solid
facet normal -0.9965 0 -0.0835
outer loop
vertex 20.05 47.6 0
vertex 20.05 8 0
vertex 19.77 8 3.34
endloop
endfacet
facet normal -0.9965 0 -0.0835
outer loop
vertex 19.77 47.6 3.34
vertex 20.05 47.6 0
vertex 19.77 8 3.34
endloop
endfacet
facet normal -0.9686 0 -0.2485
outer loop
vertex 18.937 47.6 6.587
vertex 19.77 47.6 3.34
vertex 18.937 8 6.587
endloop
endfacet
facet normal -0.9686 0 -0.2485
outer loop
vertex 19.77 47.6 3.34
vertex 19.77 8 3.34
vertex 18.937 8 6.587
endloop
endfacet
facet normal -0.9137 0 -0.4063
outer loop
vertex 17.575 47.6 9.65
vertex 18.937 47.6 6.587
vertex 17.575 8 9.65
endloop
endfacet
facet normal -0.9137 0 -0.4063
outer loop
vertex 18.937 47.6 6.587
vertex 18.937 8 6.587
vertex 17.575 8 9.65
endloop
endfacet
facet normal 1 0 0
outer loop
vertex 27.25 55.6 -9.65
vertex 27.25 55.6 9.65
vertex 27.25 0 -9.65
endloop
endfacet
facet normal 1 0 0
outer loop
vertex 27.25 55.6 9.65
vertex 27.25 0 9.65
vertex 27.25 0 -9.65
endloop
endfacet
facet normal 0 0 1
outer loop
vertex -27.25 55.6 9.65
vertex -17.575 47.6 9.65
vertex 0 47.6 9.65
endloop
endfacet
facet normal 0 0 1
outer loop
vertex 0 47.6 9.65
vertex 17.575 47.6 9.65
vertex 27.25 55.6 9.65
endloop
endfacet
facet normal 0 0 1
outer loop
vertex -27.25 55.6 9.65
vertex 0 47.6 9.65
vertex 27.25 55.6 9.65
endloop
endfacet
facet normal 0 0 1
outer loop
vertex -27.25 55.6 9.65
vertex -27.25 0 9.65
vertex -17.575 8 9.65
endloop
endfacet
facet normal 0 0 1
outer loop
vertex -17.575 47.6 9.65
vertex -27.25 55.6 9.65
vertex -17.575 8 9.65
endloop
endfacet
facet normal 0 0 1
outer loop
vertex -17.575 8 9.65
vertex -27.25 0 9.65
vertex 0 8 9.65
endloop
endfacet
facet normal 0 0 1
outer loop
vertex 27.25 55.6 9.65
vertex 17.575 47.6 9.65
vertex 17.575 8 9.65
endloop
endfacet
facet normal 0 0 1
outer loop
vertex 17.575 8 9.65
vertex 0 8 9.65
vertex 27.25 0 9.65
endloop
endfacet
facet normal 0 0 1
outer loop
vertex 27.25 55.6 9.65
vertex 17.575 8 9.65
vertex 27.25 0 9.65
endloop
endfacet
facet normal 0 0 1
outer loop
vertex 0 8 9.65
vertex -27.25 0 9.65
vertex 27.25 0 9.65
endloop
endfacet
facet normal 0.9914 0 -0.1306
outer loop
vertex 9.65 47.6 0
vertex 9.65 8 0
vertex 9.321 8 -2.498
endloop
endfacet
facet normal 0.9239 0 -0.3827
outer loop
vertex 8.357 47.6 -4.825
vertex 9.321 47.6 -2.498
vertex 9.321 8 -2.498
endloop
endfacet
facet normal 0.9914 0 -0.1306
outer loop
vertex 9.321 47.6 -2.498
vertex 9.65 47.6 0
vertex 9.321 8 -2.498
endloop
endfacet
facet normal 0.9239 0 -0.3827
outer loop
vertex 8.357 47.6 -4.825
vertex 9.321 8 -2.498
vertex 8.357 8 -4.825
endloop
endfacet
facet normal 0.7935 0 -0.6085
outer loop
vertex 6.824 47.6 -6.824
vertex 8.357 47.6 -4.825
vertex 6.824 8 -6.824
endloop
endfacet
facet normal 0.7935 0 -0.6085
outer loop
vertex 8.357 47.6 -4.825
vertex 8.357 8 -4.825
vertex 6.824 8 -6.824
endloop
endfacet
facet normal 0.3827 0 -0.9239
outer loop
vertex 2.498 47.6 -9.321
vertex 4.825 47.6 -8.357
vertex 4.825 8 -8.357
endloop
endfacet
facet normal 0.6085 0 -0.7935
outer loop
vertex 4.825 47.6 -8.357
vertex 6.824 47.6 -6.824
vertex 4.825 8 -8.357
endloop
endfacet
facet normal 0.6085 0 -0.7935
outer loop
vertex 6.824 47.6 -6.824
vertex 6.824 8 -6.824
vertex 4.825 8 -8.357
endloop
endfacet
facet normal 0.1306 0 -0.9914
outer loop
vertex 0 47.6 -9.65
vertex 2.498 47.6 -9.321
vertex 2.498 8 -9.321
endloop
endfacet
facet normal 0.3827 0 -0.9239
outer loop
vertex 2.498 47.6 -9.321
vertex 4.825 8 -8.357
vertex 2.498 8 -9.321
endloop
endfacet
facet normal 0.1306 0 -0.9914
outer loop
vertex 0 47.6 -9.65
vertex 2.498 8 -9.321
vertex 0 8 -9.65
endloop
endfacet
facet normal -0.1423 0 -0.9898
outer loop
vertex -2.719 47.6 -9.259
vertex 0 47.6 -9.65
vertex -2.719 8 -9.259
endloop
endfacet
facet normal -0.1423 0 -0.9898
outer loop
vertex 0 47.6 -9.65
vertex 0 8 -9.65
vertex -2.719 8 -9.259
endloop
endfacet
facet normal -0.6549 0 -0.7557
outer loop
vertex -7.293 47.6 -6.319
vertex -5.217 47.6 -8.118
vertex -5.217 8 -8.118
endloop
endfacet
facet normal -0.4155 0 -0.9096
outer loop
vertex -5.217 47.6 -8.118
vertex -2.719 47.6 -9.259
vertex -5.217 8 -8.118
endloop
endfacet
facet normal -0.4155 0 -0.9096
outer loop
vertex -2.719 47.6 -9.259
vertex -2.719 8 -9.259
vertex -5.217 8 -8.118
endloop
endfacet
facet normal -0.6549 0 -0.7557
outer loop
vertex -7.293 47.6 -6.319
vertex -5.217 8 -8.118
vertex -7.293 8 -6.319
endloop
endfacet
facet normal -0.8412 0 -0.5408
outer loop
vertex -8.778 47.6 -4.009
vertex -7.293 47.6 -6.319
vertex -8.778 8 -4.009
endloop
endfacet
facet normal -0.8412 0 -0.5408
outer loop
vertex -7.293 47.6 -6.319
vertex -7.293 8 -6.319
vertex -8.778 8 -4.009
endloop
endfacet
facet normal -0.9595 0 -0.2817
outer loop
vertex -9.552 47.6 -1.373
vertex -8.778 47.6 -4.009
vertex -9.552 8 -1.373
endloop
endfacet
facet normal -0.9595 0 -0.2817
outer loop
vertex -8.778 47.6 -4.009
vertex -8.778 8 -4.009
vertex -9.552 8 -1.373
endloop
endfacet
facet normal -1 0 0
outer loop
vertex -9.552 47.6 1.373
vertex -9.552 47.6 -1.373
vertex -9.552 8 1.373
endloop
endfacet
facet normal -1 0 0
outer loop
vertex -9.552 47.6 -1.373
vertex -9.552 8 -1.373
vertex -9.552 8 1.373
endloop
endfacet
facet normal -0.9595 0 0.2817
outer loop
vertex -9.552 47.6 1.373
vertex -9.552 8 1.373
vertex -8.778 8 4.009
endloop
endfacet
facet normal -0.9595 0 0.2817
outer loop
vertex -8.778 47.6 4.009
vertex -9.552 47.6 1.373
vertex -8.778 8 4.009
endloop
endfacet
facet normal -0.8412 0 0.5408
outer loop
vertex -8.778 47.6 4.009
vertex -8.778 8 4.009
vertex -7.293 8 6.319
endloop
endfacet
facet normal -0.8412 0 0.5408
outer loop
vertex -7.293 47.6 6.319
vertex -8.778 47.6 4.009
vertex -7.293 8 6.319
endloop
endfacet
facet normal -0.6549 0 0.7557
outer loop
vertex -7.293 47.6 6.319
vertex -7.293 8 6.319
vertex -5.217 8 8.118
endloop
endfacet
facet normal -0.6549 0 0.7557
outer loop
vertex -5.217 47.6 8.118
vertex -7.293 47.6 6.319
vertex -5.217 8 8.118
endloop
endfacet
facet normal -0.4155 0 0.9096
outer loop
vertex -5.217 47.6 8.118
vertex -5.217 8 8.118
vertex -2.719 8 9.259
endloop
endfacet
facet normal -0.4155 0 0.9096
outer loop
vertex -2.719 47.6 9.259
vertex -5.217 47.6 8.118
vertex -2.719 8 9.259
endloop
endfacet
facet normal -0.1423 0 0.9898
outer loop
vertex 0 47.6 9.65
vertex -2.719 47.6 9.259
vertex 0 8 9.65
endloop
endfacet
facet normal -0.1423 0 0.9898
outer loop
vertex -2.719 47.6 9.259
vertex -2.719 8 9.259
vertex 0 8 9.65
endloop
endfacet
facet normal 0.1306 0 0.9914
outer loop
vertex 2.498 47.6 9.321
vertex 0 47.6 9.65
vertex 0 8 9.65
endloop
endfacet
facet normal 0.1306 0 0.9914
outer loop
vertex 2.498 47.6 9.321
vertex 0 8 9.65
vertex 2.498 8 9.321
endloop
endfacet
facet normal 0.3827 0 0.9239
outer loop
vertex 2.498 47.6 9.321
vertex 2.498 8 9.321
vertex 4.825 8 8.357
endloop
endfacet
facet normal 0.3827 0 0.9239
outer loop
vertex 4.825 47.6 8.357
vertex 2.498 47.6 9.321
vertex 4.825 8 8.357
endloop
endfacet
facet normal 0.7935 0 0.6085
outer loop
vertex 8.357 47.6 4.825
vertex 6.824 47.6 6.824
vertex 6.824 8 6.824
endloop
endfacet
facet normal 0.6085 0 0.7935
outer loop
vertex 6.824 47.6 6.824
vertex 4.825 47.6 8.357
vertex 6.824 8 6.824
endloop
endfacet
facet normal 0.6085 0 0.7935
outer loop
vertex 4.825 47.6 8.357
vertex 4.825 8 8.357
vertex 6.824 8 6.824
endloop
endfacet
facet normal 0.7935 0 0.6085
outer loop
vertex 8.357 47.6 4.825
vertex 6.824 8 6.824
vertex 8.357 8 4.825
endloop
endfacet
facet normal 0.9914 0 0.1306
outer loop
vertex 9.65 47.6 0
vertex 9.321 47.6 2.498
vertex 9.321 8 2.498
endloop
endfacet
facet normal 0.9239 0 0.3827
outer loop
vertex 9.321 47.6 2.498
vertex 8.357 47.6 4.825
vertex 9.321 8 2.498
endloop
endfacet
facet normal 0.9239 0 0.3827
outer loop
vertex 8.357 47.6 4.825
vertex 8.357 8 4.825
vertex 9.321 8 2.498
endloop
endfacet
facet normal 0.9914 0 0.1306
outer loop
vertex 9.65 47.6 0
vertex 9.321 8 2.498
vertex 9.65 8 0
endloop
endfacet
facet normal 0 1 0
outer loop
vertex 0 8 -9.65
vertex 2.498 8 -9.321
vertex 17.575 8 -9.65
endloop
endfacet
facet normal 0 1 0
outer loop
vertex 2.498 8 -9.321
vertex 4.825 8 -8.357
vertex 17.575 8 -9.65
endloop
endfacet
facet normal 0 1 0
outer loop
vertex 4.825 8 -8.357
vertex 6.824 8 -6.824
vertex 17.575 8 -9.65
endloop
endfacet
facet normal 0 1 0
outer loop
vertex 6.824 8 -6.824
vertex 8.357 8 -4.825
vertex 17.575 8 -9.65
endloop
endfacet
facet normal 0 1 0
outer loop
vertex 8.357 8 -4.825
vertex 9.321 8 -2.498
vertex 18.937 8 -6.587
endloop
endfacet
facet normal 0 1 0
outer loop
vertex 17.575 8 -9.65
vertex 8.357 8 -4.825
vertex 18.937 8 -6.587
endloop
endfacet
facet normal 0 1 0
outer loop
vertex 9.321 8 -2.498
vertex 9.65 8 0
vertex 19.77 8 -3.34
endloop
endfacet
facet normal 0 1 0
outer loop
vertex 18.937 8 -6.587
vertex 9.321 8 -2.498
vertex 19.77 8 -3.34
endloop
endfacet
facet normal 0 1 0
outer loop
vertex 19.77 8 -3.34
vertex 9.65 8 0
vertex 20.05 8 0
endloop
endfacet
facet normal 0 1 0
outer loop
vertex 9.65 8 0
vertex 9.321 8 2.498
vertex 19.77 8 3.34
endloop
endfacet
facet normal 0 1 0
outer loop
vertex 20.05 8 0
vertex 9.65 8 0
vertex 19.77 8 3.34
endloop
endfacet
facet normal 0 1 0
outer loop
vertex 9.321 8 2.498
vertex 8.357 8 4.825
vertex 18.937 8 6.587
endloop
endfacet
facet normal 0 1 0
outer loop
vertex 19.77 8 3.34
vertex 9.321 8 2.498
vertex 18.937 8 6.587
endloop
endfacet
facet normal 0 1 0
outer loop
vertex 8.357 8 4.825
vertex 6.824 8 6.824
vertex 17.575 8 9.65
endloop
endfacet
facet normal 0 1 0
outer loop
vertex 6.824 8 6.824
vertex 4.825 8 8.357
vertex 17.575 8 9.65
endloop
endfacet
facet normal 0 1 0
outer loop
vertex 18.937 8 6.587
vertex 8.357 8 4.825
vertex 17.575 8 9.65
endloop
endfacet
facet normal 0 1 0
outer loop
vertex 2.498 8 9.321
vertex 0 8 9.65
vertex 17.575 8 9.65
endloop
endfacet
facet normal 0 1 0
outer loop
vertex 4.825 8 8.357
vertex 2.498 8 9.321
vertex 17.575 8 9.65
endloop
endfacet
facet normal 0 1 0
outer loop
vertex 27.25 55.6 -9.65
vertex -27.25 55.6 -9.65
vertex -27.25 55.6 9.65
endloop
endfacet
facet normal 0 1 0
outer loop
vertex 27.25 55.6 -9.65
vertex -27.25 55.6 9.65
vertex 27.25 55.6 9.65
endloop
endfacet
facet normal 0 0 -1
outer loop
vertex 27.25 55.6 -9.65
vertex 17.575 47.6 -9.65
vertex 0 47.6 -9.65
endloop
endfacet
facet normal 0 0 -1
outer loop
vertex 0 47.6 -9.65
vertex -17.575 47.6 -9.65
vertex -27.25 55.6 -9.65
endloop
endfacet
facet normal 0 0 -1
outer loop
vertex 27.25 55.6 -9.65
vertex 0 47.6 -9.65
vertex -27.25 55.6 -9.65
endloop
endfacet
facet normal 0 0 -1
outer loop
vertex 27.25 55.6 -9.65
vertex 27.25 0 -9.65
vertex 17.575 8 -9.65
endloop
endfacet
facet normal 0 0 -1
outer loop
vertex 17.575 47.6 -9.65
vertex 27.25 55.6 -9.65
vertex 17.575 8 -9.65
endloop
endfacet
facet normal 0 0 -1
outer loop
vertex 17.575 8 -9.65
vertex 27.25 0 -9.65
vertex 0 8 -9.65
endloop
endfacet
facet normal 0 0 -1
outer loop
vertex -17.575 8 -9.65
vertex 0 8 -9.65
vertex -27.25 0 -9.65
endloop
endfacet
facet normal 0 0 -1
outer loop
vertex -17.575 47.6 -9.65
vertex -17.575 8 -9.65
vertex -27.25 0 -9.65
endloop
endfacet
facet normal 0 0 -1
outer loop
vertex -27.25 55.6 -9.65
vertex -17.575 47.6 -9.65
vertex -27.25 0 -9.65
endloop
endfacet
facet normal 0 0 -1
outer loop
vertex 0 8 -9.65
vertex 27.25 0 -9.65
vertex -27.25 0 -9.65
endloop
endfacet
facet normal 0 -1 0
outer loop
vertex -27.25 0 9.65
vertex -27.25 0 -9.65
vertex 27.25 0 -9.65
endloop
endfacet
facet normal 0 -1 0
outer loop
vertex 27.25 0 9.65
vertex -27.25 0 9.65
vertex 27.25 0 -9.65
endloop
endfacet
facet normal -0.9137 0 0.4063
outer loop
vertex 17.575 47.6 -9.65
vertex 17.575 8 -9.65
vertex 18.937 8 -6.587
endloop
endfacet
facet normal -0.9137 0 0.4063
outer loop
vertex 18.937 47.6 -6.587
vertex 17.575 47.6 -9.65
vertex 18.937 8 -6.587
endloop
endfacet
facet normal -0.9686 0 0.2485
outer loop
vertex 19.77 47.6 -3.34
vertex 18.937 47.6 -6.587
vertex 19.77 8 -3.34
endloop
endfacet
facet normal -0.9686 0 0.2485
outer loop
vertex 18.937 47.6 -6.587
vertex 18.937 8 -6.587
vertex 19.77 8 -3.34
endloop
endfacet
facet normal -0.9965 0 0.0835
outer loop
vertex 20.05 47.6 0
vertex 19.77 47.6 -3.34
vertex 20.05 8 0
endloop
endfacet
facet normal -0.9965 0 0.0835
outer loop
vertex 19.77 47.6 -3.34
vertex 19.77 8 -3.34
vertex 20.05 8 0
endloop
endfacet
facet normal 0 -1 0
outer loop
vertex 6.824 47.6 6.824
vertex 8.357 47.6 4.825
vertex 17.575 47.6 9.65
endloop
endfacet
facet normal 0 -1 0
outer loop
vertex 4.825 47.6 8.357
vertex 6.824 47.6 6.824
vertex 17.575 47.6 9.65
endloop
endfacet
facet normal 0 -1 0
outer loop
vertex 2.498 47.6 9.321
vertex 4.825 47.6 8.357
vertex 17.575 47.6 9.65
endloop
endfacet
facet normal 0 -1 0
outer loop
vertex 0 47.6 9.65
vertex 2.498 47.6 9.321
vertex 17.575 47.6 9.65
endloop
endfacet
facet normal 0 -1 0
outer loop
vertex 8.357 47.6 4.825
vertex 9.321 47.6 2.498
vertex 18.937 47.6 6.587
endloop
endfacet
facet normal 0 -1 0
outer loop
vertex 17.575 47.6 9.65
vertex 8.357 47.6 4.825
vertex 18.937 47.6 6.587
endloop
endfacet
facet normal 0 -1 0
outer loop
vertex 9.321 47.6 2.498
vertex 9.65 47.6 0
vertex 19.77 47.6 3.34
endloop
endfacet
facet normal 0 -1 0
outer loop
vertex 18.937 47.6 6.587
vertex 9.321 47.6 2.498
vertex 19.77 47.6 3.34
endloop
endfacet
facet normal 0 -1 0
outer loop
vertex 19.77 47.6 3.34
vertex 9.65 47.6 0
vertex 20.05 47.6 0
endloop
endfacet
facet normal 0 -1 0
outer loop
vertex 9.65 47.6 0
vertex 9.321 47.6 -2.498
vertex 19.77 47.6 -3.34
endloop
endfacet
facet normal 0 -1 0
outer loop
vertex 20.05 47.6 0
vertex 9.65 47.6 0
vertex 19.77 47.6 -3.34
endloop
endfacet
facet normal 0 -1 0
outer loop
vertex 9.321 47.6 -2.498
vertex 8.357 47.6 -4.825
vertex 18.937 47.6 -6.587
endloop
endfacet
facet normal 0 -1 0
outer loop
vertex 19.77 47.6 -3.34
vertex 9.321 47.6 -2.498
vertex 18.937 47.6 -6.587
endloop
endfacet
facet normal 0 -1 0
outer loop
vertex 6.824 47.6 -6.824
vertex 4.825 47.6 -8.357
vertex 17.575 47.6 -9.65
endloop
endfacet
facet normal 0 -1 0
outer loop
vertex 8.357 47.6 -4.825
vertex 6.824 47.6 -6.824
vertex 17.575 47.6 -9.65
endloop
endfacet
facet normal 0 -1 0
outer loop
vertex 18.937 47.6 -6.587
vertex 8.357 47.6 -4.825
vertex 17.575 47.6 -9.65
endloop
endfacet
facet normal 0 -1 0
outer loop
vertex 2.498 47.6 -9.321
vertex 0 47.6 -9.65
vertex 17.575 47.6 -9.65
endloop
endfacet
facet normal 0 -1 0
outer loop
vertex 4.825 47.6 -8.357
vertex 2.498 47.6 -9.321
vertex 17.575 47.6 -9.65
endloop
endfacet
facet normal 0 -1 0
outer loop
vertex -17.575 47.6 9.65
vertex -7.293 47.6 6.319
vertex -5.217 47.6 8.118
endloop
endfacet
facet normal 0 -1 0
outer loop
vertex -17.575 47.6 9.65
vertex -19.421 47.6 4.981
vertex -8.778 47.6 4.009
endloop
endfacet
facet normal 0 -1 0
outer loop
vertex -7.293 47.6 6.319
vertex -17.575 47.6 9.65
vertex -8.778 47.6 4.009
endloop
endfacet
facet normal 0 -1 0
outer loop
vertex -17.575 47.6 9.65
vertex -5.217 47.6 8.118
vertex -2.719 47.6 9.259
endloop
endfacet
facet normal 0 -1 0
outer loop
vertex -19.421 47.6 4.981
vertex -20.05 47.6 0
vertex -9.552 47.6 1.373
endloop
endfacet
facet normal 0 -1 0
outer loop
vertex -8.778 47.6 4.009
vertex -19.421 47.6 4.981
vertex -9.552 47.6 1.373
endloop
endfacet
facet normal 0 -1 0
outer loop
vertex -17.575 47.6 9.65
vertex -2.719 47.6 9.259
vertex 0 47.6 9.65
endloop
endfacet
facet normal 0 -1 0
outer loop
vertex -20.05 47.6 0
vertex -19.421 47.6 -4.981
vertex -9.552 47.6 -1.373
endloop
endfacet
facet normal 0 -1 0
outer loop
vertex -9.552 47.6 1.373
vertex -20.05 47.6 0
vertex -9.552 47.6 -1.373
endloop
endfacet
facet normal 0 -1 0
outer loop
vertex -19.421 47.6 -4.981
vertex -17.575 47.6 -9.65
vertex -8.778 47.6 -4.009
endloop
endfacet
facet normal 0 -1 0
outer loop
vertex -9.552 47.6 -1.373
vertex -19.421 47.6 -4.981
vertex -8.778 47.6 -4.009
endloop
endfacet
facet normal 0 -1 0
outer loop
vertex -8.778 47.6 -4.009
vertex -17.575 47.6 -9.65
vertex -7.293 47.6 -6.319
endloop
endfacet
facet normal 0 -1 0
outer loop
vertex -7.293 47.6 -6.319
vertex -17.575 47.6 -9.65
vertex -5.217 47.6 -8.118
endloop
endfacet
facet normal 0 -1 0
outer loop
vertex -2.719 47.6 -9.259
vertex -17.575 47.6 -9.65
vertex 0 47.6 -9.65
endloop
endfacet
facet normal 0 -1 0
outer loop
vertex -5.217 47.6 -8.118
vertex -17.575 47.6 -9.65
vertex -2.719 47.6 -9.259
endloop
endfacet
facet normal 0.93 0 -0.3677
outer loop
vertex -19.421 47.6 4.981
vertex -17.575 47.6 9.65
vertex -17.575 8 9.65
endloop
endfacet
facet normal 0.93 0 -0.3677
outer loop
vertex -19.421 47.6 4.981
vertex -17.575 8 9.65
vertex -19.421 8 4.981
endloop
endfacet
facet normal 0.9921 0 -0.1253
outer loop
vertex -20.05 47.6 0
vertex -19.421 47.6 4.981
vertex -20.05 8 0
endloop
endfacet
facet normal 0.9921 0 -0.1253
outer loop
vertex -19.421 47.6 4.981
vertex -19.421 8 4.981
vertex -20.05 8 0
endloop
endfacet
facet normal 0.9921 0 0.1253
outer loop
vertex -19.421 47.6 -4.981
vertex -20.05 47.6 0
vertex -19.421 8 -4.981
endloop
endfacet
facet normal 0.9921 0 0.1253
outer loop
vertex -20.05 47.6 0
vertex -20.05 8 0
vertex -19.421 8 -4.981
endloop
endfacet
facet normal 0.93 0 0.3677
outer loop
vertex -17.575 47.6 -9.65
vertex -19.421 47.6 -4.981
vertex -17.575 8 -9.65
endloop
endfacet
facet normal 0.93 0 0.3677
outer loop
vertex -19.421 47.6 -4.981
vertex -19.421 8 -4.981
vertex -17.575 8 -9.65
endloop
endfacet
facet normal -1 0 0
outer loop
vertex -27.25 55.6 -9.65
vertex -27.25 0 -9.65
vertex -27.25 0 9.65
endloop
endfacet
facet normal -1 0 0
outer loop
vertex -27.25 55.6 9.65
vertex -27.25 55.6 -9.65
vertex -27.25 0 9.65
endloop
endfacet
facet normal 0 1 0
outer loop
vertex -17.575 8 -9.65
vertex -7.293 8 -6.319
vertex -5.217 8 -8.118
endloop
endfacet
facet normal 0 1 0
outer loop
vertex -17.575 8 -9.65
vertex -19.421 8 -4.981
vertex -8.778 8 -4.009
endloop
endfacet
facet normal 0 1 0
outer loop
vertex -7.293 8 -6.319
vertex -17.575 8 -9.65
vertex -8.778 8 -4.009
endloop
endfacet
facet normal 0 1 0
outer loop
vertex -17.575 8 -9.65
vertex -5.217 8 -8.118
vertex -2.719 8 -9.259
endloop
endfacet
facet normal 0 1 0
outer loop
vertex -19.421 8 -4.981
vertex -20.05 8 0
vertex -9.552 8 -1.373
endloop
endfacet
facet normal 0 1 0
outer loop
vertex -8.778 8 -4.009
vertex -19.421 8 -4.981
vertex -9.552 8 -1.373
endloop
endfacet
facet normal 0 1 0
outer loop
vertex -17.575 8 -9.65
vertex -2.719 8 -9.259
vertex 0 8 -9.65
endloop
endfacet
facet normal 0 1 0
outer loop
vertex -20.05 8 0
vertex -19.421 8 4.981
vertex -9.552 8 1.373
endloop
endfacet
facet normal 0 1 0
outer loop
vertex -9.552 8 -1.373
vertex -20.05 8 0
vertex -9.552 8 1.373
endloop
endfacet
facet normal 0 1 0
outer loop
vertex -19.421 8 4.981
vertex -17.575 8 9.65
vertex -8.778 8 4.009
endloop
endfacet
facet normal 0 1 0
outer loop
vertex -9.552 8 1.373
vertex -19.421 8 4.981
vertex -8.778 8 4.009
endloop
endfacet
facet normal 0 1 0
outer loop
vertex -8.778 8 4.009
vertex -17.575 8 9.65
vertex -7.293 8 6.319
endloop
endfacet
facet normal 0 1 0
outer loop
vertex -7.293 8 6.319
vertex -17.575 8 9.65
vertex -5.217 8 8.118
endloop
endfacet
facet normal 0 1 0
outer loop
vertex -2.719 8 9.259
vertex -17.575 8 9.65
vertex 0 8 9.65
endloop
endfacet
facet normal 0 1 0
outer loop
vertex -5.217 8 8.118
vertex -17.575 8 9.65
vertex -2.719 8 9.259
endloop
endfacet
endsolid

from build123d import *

# Parameters (mm, degrees)
BOSS_EXTRUDE1_DEPTH   = 55.6
SKETCH1_R             = 9.65
BOSS_EXTRUDE1_2_DEPTH = 55.6
BOSS_EXTRUDE1_3_DEPTH = 55.6
SKETCH2_W             = 54.5
SKETCH2_H             = 19.3
BOSS_EXTRUDE2_DEPTH   = 8
SKETCH3_W             = 54.5
SKETCH3_H             = 19.3
BOSS_EXTRUDE3_DEPTH   = 8


with BuildPart() as part:
    # Sketch1 → Boss-Extrude1 (new body)
    with BuildSketch(Plane(origin=(0, 0, 0), x_dir=(1, 0, 0), z_dir=(0, 1, 0))):
        with BuildLine():
            Line((-17.574982219, 9.65), (-27.25, 9.65))
            Line((-27.25, 9.65), (-27.25, -9.65))
            Line((-27.25, -9.65), (-17.574982219, -9.65))
            ThreePointArc((-17.574982219, -9.65), (-20.05, 0), (-17.574982219, 9.65))
        make_face()
    extrude(amount=BOSS_EXTRUDE1_DEPTH)



with BuildPart() as body_2:
    # Sketch1 → Boss-Extrude1 2 (new body)
    with BuildSketch(Plane(origin=(0, 0, 0), x_dir=(1, 0, 0), z_dir=(0, 1, 0))):
        Circle(SKETCH1_R)
    extrude(amount=BOSS_EXTRUDE1_2_DEPTH)


with BuildPart() as body_3:
    # Sketch1 → Boss-Extrude1 3 (new body)
    with BuildSketch(Plane(origin=(0, 0, 0), x_dir=(1, 0, 0), z_dir=(0, 1, 0))):
        with BuildLine():
            Line((27.25, 9.65), (17.574982219, 9.65))
            ThreePointArc((17.574982219, 9.65), (19.421391473, 4.981169868), (20.05, 0))
            ThreePointArc((20.05, 0), (19.421391473, -4.981169868), (17.574982219, -9.65))
            Line((17.574982219, -9.65), (27.25, -9.65))
            Line((27.25, -9.65), (27.25, 9.65))
        make_face()
    extrude(amount=BOSS_EXTRUDE1_3_DEPTH)


with BuildPart() as part_1:
    add(part.part)

    add(body_2.part)  # Boss-Extrude2 merges body 2

    add(body_3.part)  # Boss-Extrude2 merges body 3
    # Sketch2 → Boss-Extrude2 (add)
    with BuildSketch(Plane(origin=(0, 55.6, 0), x_dir=(1, 0, 0), z_dir=(0, 1, 0))):
        Rectangle(SKETCH2_W, SKETCH2_H)
    extrude(amount=-BOSS_EXTRUDE2_DEPTH)

    # Sketch3 → Boss-Extrude3 (add)
    with BuildSketch(Plane.XZ):
        Rectangle(SKETCH3_W, SKETCH3_H)
    extrude(amount=-BOSS_EXTRUDE3_DEPTH)


solid = part_1.part
